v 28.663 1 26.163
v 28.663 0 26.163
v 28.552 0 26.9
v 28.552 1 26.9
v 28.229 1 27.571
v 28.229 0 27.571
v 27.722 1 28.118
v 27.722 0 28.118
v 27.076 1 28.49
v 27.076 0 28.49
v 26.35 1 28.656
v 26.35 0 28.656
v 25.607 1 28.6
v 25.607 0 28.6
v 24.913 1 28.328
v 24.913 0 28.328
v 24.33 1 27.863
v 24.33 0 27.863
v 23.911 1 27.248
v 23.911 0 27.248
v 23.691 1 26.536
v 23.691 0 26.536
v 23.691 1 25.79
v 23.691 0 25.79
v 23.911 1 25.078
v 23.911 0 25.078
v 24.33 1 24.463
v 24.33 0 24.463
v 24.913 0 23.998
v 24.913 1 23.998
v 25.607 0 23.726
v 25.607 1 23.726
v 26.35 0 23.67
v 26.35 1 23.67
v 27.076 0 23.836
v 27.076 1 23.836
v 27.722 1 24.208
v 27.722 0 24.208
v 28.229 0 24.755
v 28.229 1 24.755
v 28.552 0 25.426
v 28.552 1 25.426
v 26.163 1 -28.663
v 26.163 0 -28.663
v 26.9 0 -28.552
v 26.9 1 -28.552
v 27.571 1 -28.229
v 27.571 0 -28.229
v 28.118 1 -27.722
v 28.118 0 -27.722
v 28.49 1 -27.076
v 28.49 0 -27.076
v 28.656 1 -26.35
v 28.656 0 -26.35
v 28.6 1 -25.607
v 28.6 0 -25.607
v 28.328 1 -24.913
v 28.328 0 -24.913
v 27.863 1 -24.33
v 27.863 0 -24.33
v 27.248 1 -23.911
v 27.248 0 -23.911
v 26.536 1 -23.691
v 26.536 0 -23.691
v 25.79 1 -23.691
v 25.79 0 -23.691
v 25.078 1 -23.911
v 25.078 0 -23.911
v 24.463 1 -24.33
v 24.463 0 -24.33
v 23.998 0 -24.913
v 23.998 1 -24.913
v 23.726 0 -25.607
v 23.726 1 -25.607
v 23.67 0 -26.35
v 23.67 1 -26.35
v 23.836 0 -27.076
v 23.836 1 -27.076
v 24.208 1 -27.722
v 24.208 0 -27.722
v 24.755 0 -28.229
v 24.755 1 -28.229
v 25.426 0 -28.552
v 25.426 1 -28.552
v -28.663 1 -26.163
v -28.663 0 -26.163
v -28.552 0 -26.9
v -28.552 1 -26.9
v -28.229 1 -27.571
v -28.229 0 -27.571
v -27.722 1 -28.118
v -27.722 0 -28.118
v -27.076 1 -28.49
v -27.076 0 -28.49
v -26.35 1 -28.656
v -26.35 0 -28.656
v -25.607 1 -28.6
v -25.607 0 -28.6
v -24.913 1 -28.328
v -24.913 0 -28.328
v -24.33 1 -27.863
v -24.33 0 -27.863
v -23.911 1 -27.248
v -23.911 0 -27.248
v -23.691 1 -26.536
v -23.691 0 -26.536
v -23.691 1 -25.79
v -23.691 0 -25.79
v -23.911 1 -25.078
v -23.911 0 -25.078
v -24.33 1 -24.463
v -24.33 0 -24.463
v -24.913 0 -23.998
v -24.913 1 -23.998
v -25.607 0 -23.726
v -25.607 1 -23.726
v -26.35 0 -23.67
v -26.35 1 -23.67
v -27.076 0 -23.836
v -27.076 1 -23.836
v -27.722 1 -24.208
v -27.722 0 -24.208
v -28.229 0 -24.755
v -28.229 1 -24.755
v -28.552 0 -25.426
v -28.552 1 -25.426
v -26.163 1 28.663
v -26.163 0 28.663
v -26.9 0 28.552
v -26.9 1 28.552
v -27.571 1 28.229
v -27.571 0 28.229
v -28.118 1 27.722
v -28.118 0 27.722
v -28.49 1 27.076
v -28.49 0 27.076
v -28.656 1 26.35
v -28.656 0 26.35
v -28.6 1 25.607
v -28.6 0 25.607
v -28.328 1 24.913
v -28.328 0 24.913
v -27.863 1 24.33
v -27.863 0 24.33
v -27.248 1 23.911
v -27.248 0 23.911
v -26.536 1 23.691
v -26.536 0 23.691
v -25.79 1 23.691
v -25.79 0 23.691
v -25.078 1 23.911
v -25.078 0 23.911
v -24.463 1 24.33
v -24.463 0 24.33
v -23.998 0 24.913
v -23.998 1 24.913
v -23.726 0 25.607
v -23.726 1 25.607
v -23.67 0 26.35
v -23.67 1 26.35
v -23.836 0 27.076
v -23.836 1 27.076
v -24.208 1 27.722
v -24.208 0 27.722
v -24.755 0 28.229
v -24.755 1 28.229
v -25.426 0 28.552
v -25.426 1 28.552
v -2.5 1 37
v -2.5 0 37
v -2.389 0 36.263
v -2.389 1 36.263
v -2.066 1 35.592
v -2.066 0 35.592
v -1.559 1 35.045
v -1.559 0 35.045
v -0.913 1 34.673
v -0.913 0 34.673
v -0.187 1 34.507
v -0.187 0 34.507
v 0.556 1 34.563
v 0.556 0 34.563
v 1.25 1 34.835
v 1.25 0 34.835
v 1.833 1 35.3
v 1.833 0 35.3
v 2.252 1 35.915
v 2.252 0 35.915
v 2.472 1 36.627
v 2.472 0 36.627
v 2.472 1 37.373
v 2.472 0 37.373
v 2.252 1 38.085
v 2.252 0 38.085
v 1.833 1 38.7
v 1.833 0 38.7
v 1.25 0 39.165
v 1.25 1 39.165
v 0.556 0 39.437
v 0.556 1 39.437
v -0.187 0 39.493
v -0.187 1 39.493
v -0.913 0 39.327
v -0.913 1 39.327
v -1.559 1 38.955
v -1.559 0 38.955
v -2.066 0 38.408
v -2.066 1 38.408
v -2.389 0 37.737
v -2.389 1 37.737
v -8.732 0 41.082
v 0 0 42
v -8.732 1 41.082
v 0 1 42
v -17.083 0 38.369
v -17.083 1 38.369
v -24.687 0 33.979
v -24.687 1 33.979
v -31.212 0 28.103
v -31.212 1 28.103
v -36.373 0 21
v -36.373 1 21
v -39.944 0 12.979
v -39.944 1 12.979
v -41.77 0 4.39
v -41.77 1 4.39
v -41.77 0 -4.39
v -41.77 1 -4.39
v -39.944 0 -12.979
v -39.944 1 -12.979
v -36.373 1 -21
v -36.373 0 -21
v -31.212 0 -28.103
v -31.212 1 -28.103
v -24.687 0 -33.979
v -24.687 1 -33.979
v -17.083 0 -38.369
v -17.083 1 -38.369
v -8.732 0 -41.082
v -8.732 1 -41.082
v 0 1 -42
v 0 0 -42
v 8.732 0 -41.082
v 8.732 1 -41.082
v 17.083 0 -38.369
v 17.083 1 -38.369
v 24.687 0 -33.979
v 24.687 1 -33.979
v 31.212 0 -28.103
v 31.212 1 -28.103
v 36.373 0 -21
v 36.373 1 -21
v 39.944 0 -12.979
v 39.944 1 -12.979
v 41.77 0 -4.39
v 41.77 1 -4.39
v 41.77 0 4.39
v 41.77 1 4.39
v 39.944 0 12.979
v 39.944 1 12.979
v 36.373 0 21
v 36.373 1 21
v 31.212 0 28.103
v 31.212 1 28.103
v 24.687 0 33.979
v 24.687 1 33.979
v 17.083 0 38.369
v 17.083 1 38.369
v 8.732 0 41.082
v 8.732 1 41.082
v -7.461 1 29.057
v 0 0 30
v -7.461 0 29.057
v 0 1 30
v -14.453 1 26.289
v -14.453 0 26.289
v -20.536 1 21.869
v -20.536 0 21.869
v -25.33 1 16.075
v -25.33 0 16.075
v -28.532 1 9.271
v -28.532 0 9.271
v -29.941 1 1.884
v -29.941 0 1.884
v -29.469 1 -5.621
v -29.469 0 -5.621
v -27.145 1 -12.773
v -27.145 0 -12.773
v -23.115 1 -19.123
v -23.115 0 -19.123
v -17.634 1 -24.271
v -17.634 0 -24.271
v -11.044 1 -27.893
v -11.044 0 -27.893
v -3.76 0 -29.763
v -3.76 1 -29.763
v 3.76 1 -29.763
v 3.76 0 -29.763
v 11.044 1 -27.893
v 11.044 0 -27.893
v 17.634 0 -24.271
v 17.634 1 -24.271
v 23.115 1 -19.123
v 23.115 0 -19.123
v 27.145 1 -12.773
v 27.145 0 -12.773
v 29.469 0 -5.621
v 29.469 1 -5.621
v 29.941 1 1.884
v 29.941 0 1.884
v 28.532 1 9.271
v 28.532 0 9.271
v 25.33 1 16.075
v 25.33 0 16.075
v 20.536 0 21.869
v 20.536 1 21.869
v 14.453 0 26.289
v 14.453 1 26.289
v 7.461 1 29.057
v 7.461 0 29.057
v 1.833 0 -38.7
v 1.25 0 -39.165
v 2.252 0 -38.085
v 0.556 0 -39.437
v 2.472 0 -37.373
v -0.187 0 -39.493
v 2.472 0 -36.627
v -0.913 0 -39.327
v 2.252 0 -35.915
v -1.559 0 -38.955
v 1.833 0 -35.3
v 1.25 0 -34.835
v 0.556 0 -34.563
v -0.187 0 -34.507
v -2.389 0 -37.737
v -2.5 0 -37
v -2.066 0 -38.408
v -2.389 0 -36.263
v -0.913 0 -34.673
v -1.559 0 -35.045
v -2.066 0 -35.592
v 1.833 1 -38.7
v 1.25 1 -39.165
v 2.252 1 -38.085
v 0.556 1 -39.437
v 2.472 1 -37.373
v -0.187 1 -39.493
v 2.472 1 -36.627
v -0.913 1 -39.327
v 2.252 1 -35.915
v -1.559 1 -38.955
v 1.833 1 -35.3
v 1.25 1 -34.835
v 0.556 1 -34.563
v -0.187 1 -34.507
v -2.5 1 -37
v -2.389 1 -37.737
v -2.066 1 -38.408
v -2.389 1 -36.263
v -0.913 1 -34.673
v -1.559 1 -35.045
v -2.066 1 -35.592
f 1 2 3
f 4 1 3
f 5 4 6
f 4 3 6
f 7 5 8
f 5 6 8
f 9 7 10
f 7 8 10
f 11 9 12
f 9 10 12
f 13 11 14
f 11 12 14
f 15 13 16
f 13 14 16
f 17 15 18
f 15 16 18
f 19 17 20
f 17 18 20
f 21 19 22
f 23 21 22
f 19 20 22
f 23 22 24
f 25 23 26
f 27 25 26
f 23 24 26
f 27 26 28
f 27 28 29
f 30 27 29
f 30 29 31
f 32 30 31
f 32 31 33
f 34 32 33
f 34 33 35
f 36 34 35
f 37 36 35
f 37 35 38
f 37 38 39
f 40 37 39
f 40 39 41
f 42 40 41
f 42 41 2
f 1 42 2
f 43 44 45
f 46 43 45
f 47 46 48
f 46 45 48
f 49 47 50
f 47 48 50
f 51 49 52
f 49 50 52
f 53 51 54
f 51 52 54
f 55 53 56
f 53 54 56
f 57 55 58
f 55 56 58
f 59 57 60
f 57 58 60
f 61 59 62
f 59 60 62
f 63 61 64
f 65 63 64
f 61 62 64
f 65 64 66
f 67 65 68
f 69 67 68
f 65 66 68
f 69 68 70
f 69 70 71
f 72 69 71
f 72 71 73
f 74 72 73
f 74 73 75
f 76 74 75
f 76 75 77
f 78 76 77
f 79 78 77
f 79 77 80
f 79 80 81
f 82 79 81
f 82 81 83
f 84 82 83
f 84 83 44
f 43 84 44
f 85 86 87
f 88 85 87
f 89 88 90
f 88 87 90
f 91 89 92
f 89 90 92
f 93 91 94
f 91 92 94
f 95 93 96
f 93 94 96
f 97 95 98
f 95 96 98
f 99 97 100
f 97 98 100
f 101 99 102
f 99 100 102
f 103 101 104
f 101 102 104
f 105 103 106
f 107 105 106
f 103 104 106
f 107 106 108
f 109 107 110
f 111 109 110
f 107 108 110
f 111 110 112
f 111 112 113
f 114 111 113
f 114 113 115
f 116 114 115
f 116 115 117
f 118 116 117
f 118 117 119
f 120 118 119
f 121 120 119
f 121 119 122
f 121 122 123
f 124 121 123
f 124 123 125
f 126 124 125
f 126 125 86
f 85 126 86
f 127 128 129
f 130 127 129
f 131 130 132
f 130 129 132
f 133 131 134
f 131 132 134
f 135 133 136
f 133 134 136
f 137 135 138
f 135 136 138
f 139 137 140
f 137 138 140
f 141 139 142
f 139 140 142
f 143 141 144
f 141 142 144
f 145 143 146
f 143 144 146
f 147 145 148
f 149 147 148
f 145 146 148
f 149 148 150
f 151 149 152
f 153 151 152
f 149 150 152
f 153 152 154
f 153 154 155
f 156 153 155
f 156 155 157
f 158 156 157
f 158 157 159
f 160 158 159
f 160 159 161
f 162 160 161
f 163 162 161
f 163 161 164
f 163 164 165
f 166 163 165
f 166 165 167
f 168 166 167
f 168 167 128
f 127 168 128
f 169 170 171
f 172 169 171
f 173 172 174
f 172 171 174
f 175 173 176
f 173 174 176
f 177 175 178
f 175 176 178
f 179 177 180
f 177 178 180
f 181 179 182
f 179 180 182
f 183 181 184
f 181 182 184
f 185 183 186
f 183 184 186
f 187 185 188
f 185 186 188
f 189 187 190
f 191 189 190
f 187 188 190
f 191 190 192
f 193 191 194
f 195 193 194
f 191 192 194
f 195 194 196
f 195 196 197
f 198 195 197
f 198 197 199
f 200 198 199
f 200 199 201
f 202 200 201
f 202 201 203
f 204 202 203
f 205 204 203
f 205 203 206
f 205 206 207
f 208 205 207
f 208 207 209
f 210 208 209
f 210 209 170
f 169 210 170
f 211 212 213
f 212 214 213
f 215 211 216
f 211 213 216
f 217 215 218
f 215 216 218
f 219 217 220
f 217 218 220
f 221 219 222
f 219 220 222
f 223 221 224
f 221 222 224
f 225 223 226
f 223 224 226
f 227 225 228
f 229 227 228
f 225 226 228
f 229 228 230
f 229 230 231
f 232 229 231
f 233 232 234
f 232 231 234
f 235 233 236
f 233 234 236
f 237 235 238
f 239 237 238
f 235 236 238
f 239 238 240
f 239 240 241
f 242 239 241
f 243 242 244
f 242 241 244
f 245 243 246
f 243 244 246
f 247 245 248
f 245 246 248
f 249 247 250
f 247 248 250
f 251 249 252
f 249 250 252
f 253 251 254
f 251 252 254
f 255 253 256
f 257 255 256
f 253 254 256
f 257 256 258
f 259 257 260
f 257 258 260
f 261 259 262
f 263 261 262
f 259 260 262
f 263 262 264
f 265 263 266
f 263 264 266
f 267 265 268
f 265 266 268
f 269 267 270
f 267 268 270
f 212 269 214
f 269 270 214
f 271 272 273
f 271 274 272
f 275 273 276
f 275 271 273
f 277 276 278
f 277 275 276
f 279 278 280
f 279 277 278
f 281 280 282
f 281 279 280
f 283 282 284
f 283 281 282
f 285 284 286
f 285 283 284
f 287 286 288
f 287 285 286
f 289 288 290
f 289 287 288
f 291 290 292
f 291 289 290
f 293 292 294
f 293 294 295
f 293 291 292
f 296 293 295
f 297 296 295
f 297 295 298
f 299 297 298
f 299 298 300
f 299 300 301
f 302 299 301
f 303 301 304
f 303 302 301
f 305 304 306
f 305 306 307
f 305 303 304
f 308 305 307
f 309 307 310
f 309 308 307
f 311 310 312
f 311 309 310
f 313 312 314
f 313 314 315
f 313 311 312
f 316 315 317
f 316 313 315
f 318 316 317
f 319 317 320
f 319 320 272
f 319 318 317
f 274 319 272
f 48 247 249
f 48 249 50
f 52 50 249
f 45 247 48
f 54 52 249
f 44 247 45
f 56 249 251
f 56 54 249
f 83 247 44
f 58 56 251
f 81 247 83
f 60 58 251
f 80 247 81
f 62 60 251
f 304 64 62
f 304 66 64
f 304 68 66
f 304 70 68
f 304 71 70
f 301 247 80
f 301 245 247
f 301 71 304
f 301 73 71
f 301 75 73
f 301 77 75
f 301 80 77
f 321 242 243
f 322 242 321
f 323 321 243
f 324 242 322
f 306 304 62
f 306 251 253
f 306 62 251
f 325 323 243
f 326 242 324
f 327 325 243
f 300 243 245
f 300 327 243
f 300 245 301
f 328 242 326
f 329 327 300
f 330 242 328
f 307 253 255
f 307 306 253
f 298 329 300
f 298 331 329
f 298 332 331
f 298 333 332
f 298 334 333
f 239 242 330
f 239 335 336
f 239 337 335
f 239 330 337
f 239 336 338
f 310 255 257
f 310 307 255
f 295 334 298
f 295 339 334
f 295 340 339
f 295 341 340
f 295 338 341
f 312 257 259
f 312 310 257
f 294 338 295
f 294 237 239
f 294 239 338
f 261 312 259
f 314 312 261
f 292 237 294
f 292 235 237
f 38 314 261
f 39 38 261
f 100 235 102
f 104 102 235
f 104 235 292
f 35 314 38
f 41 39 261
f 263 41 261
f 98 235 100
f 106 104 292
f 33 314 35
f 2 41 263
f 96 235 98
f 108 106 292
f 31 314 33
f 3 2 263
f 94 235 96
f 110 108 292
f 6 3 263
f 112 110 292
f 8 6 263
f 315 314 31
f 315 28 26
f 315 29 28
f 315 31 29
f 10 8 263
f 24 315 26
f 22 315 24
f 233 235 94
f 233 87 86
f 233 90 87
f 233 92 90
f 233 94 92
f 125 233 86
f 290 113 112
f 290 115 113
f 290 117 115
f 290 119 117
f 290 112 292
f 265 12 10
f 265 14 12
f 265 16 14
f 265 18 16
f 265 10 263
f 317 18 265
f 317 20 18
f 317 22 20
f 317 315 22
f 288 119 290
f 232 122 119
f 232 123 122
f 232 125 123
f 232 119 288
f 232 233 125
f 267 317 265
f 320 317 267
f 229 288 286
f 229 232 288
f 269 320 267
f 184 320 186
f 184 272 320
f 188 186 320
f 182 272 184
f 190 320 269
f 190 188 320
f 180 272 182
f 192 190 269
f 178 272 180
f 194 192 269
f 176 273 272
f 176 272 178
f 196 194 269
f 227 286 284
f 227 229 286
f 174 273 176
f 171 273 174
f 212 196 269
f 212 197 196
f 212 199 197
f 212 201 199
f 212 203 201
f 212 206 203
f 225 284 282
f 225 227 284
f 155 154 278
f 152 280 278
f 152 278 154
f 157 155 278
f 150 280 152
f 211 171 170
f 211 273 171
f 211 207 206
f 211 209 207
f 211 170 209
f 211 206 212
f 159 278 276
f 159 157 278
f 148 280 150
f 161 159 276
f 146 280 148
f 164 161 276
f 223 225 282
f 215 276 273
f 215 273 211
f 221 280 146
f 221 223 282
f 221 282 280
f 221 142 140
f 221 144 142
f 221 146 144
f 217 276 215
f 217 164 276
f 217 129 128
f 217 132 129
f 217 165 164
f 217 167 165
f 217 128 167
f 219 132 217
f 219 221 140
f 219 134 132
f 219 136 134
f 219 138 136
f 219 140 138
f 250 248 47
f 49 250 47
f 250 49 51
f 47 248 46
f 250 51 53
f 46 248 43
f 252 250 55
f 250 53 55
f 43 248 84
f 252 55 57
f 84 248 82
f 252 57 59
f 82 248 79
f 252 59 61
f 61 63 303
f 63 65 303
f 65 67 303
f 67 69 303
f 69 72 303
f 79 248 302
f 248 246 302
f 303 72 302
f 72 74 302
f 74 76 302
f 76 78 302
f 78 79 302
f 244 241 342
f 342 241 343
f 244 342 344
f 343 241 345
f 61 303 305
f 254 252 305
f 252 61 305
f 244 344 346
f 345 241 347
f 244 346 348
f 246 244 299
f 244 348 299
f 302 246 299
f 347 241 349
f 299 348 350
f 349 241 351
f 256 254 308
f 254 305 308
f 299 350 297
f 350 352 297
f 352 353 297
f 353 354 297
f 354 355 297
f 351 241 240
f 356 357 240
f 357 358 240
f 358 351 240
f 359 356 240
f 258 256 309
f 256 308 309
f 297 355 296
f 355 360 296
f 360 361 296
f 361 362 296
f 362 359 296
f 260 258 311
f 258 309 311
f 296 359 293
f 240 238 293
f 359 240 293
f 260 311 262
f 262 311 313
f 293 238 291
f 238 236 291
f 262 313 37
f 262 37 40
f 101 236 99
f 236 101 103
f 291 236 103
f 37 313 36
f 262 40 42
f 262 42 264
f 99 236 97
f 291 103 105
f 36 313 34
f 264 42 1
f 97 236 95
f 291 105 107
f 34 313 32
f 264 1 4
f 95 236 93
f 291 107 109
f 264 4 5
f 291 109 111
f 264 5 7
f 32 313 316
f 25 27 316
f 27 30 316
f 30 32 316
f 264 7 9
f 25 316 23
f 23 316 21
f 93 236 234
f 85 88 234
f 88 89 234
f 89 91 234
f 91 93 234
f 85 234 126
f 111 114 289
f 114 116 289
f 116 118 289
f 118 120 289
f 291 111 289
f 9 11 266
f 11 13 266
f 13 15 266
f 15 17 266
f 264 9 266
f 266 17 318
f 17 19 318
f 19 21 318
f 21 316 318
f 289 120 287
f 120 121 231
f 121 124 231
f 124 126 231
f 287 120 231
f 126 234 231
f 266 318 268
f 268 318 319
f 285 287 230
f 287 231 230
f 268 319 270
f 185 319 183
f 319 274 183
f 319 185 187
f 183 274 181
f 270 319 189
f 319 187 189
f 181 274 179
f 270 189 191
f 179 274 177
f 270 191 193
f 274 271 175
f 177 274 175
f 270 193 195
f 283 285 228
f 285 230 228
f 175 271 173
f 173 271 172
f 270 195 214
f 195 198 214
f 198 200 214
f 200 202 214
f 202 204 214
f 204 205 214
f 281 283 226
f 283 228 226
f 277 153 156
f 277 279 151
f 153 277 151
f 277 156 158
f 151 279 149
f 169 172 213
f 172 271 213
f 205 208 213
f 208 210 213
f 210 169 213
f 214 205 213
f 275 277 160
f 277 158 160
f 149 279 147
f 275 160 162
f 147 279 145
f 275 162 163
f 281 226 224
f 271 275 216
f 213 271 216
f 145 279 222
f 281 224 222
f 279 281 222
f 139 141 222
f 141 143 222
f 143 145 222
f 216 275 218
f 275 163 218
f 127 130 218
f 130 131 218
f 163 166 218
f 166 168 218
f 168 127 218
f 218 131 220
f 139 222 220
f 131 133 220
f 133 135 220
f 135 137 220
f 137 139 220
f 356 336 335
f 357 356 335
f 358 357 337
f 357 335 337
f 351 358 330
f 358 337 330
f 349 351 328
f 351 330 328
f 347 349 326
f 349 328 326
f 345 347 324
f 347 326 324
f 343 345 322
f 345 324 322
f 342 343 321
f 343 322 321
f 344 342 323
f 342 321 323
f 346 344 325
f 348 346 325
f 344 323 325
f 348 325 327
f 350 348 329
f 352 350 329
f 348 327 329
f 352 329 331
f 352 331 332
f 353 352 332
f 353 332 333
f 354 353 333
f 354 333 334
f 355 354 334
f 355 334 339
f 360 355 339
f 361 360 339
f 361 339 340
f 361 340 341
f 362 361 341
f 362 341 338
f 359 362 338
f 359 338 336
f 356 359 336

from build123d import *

# Parameters (mm, degrees)
ESQUISSE1_W                   = 12
ESQUISSE1_H                   = 1
DIAM_TRE_DU_PER_AGE_5_0_5_1_D = 5
DIAM_TRE_DU_PER_AGE_5_0_5_2_D = 5
R_P_TITION_CIRCULAIRE1_COUNT  = 4


with BuildPart() as part:
    # Esquisse1 → Révolution1 (revolve)
    with BuildSketch(Plane(origin=(0, 0, 0), x_dir=(0, 0, -1), z_dir=(1, 0, 0))):
        with Locations((-36, 0.5)):
            Rectangle(ESQUISSE1_W, ESQUISSE1_H)
    revolve(axis=Axis((0, 0, 0), (0, -1, 0)))

    # Diamètre du perçage Ø5.0 (5)1 (through all)
    with Locations(Plane(origin=(0, 1, 0), x_dir=(1, 0, 0), z_dir=(0, 1, 0))):
        with Locations((0, 37), (0, -37)):
            Hole(DIAM_TRE_DU_PER_AGE_5_0_5_1_D / 2)

    # Diamètre du perçage Ø5.0 (5)2 (through all)
    with Locations(Plane(origin=(0, 1, 0), x_dir=(1, 0, 0), z_dir=(0, 1, 0))):
        with Locations((-26.162950904, 26.162950904)):
            diam_tre_du_per_age_5_0_5_2 = Hole(DIAM_TRE_DU_PER_AGE_5_0_5_2_D / 2)

    # Répétition circulaire1: Diamètre du perçage Ø5.0 (5)2 ×4 about axis
    r_p_tition_circulaire1_axis = Axis((0, 0, 0), (0, 1, 0))
    for i in range(1, R_P_TITION_CIRCULAIRE1_COUNT):
        add(diam_tre_du_per_age_5_0_5_2.rotate(r_p_tition_circulaire1_axis, i * 360 / R_P_TITION_CIRCULAIRE1_COUNT), mode=Mode.SUBTRACT)


solid = part.part
